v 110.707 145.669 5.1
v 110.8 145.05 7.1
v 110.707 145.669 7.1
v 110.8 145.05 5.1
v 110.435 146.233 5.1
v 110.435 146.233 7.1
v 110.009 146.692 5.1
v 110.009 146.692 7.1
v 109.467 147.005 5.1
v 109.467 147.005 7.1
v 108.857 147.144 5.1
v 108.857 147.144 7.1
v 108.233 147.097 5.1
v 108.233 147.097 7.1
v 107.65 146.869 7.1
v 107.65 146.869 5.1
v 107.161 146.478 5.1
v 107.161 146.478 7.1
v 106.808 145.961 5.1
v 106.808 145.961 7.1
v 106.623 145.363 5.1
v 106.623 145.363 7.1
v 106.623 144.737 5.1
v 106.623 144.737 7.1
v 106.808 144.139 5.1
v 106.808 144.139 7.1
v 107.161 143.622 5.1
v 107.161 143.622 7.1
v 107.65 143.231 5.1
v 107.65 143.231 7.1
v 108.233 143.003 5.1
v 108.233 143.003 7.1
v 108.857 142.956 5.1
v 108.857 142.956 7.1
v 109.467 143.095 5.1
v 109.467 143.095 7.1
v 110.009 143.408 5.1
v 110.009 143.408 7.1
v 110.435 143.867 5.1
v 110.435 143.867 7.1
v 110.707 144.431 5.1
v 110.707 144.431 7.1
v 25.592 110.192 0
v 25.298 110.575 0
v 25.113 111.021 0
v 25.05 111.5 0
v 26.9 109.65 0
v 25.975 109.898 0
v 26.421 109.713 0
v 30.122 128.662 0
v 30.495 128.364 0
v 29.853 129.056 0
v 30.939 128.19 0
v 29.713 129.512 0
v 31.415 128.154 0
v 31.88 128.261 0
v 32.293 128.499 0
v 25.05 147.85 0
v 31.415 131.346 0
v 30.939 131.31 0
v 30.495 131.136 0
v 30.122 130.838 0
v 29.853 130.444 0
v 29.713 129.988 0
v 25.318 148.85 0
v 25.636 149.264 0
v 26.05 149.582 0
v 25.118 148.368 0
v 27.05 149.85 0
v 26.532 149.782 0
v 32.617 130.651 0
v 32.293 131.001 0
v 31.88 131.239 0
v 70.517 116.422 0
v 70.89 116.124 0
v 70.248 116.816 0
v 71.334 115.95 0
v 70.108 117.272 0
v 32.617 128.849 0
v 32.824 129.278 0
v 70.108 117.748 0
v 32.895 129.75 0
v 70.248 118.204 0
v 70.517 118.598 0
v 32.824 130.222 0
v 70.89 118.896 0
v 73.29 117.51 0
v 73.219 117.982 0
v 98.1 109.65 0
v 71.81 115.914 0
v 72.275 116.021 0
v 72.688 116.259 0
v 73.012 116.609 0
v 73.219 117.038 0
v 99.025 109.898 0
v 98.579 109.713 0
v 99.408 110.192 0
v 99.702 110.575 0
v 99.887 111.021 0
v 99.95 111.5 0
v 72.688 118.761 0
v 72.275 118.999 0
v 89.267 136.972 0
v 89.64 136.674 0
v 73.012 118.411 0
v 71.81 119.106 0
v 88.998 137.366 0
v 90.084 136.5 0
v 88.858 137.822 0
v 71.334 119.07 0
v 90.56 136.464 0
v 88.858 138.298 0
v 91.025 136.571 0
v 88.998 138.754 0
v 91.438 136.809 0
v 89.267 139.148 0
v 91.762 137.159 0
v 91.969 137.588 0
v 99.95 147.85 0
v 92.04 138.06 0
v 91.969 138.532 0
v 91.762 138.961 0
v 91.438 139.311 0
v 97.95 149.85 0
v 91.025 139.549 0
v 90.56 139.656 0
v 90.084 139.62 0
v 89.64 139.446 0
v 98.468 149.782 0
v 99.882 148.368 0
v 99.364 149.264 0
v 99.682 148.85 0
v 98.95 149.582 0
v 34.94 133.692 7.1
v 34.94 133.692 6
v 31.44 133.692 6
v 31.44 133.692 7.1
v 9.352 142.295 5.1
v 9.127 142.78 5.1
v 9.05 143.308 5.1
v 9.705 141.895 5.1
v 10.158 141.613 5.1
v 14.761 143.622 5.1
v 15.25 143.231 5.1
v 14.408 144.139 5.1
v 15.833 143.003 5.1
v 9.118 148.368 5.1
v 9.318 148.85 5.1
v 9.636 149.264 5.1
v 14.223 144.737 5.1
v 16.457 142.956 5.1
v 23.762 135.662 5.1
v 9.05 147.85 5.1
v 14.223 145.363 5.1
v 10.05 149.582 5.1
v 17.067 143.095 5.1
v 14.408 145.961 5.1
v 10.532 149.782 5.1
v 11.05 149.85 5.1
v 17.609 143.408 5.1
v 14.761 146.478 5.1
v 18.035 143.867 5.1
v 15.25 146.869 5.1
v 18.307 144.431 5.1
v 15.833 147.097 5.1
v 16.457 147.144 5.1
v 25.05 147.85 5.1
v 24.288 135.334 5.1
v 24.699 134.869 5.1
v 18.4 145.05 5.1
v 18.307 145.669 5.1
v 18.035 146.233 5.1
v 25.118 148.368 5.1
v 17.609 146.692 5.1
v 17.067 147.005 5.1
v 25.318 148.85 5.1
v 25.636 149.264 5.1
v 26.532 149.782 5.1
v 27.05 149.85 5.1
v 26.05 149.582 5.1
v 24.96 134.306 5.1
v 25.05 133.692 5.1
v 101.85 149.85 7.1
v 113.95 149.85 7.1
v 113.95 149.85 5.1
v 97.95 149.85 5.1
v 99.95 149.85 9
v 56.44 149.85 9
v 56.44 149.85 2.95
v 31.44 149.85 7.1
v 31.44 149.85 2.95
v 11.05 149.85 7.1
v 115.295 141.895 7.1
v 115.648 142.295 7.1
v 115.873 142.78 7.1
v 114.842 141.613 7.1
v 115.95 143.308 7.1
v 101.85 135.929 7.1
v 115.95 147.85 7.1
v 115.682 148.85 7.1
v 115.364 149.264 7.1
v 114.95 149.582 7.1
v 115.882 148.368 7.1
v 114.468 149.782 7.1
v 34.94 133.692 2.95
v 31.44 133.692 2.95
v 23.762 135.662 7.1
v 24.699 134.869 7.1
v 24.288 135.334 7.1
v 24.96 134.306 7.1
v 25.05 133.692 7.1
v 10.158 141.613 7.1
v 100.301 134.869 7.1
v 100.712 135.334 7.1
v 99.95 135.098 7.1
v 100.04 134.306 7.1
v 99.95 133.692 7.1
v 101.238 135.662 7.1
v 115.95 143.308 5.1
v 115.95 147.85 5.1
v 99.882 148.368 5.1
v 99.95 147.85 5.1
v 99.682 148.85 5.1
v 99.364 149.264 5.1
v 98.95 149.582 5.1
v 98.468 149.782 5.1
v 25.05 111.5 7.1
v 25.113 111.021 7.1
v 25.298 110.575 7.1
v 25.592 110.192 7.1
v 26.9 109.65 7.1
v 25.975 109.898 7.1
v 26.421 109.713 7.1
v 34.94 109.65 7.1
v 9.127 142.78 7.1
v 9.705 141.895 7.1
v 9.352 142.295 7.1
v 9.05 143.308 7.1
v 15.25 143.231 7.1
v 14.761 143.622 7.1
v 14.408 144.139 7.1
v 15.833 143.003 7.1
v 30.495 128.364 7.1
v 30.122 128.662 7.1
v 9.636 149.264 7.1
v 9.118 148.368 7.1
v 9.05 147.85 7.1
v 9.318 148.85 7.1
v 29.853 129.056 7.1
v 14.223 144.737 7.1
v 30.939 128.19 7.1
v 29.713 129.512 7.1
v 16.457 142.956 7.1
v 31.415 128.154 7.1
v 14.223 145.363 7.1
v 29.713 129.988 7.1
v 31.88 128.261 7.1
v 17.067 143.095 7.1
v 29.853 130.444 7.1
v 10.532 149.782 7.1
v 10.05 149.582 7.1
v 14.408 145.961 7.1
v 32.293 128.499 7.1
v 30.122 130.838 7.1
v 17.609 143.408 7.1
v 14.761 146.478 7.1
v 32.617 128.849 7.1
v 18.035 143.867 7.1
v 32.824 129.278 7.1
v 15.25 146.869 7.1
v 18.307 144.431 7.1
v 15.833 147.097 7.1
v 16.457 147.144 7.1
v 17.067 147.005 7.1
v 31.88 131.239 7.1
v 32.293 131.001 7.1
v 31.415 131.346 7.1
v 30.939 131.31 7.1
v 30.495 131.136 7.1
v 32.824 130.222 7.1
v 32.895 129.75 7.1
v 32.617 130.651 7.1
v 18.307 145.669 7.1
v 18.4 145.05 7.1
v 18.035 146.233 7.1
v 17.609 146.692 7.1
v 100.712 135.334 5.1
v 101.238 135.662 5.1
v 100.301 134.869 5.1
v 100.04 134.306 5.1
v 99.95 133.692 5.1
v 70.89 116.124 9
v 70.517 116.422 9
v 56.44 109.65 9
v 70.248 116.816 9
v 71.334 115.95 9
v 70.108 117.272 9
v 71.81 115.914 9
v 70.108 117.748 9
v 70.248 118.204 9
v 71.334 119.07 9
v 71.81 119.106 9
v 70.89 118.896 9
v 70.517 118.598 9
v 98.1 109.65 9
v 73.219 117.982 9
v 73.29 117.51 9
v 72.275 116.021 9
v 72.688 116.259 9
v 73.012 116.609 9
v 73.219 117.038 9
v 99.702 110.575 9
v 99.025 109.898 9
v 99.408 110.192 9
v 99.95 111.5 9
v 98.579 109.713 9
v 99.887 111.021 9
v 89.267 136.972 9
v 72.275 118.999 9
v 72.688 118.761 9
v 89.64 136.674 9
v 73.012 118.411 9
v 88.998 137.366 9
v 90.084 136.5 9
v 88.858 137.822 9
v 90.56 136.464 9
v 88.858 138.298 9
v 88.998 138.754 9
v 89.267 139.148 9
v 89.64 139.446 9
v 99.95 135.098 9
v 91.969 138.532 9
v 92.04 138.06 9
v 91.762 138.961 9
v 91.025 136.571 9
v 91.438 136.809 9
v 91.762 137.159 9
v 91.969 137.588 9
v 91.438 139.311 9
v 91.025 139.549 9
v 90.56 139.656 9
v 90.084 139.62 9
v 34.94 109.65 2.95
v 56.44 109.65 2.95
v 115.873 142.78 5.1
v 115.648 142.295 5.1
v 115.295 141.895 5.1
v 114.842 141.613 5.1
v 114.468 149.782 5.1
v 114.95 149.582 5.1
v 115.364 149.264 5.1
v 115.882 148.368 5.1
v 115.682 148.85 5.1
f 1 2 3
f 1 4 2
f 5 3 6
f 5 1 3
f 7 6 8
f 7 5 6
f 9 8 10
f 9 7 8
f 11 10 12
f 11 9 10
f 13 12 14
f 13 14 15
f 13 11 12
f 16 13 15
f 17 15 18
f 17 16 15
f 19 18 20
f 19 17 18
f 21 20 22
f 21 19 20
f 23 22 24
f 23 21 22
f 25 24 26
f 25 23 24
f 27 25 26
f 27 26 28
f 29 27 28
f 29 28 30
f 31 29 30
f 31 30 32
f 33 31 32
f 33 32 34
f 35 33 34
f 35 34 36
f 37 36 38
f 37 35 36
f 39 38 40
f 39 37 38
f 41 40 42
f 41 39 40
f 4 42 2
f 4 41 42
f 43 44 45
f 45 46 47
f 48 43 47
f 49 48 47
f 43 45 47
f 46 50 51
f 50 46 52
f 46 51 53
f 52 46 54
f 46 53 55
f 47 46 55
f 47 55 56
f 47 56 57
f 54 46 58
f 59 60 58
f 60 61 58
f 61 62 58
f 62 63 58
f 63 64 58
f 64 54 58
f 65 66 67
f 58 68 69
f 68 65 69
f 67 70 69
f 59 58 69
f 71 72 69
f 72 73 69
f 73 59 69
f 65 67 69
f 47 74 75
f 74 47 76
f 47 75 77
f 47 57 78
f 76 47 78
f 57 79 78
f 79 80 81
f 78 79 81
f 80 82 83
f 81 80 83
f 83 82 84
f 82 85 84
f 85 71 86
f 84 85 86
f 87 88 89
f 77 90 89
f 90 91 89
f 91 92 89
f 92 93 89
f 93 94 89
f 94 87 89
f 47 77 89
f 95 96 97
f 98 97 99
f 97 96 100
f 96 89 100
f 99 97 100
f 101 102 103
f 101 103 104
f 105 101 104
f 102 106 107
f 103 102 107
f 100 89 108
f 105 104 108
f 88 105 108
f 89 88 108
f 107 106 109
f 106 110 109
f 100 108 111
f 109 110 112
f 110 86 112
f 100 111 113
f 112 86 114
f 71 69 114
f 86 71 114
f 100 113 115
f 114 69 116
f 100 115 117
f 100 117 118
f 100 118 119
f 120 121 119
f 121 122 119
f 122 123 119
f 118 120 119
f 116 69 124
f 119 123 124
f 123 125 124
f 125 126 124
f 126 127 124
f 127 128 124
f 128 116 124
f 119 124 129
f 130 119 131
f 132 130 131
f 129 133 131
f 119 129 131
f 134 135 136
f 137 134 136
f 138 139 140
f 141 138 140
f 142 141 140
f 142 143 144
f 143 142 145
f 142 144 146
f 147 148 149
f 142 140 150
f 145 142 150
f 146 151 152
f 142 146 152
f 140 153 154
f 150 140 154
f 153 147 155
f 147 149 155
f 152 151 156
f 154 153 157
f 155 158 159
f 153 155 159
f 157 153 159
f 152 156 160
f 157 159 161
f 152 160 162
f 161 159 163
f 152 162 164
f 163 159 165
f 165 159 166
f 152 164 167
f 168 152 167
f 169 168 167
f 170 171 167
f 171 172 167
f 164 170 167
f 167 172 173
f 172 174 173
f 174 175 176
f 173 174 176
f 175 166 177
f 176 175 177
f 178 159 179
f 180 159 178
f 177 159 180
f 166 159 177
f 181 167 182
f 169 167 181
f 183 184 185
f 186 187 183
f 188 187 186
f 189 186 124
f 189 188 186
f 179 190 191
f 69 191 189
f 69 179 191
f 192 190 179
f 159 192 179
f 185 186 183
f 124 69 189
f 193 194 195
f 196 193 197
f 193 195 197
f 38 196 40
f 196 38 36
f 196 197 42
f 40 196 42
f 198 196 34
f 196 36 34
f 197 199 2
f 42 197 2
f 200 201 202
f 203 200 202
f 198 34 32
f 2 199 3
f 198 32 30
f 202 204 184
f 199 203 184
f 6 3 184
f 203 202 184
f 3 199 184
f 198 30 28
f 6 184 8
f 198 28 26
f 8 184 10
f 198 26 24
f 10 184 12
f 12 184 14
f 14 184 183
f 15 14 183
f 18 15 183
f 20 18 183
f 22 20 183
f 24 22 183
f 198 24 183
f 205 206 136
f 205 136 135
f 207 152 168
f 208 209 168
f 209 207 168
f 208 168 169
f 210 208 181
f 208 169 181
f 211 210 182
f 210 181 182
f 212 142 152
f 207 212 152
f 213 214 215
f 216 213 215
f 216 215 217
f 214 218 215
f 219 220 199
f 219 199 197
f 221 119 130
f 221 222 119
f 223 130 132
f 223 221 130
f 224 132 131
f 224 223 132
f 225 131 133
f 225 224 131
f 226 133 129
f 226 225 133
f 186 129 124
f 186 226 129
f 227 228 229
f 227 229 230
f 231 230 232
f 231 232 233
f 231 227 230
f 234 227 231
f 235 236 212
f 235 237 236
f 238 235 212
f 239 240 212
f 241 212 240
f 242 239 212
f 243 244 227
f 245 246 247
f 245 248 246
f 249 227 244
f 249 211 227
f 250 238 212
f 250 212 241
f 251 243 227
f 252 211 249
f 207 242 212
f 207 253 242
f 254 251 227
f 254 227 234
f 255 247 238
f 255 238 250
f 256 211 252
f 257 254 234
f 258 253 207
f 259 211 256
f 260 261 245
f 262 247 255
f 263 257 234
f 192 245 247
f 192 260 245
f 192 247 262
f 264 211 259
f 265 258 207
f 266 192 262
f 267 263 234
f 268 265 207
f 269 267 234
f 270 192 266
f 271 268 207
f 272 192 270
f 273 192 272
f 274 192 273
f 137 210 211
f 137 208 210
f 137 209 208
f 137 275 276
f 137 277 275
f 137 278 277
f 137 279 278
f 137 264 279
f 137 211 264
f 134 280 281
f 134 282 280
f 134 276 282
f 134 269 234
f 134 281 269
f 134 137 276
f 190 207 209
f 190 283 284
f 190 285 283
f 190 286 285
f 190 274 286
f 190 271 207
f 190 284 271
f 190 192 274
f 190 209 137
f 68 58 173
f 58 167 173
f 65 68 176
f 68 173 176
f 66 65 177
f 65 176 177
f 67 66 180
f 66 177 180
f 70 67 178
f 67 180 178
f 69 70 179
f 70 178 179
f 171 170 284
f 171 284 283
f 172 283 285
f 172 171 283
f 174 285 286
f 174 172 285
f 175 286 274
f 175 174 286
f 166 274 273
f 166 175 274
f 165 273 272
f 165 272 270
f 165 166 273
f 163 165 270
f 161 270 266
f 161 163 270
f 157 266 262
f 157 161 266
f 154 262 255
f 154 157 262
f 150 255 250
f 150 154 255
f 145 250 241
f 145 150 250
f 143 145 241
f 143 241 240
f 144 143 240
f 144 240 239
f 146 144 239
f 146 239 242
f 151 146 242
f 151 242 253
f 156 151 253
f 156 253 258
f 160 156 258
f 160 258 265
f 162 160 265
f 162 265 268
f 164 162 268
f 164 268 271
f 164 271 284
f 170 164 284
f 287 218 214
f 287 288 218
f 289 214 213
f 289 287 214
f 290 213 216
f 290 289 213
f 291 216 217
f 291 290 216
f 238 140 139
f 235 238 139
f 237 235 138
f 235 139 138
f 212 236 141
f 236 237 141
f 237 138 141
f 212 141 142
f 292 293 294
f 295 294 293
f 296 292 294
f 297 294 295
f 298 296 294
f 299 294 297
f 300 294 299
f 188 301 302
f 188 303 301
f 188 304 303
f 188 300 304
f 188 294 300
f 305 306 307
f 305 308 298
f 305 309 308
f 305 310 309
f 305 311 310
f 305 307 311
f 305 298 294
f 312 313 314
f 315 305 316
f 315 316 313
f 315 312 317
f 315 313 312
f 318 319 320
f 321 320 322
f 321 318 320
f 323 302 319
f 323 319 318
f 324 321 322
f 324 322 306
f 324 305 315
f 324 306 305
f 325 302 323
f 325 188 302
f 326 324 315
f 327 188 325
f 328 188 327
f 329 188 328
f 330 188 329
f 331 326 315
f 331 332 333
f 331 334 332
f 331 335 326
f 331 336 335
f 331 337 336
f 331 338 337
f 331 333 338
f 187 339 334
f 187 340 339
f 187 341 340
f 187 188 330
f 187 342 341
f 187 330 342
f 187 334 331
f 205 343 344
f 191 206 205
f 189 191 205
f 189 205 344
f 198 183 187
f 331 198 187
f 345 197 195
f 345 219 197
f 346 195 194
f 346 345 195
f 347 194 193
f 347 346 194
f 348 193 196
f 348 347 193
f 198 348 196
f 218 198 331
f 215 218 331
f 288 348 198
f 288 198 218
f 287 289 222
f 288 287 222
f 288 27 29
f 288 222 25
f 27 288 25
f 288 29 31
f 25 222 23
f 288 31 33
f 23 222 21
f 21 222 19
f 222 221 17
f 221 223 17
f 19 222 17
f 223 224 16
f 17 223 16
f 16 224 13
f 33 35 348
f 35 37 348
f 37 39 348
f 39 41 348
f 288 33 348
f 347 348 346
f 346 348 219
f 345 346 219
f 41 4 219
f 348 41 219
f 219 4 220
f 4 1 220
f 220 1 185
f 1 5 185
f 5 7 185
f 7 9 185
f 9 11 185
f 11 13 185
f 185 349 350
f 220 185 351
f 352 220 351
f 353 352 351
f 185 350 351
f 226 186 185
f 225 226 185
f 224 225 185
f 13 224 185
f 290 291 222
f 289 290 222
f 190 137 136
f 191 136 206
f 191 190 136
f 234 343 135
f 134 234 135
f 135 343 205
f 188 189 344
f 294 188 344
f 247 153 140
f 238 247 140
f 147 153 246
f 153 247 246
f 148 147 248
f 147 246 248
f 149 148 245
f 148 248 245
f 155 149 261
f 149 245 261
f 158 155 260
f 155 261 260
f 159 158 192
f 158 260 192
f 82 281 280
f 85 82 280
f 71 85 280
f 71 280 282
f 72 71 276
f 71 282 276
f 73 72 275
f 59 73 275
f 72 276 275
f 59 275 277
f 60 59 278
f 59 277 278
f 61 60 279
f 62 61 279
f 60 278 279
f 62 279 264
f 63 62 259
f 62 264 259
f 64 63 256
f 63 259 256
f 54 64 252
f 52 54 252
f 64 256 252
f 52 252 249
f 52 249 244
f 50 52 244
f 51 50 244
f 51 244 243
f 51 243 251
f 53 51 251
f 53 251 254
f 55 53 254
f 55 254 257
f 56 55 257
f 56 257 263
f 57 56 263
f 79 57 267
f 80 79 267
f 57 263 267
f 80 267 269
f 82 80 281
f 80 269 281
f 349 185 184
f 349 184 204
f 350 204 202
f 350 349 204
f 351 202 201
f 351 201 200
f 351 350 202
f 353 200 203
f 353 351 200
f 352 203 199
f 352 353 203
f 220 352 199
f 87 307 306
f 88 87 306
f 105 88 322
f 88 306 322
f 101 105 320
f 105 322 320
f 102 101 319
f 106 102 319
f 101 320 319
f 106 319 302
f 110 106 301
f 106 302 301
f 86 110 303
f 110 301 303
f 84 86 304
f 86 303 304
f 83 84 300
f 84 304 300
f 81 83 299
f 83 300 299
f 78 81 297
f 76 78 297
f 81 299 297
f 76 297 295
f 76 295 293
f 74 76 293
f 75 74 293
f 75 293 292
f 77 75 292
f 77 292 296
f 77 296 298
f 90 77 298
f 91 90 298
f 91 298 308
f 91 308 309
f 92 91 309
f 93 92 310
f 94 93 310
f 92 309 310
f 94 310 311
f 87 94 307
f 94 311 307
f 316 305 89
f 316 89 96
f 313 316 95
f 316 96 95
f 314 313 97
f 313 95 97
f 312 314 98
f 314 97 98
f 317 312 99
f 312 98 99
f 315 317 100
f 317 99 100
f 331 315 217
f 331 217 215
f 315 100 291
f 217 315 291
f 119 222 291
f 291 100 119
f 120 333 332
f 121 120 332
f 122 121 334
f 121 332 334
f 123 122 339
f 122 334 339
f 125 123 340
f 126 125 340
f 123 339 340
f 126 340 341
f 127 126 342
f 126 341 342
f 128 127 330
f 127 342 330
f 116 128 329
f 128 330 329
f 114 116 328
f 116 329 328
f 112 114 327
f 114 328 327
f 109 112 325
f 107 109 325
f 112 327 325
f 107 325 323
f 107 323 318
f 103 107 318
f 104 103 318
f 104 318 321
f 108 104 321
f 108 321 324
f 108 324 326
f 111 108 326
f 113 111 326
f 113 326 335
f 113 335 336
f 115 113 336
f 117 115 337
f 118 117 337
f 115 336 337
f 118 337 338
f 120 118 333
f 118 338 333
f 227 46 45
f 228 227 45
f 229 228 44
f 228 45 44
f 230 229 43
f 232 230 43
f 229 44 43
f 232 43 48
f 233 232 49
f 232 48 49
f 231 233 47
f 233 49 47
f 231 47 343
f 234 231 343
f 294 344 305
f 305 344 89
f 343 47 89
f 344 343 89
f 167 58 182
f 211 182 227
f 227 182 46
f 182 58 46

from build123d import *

# Parameters (mm, degrees)
BOSS_EXTRUDE1_DEPTH  = 5.1
SKETCH2_R            = 2.1
BOSS_EXTRUDE2_DEPTH  = 0.9
FILLET1_R            = 2
SKETCH3_R            = 2.1
BOSS_EXTRUDE3_DEPTH  = 1.1
BOSS_EXTRUDE4_DEPTH  = 16.158031
SKETCH5_W            = 25
SKETCH5_H            = 40.2
CUT_EXTRUDE2_DEPTH   = 3.05
SKETCH6_W            = 6
SKETCH6_H            = 24.2
BOSS_EXTRUDE5_DEPTH  = 3.5
CUT_EXTRUDE3_DEPTH   = 16.158031
BOSS_EXTRUDE6_DEPTH  = 3
BOSS_EXTRUDE7_REACH  = 42.2
SKETCH21_R           = 1.6
CUT_EXTRUDE6_DEPTH   = 9
CUT_EXTRUDE7_DEPTH   = 17.15803115
SKETCH23_W           = 1.1
SKETCH23_H           = 16.15803115
BOSS_EXTRUDE9_DEPTH  = 6.39
SKETCH26_W           = 3.5
SKETCH26_H           = 3.05
CUT_EXTRUDE11_DEPTH  = 0.158031
BOSS_EXTRUDE10_DEPTH = 1.1
SKETCH28_R           = 1.6
CUT_EXTRUDE12_DEPTH  = 7.1


with BuildPart() as part:
    # Sketch1 → Boss-Extrude1 (new body)
    with BuildSketch(Plane.XY):
        with BuildLine():
            Line((99.95, 149.85), (25.05, 149.85))
            Line((25.05, 149.85), (25.05, 148))
            Line((25.05, 148), (25.05, 111.5))
            ThreePointArc((25.05, 111.5), (25.591852455, 110.191852455), (26.9, 109.65))
            Line((26.9, 109.65), (98.1, 109.65))
            ThreePointArc((98.1, 109.65), (99.408147545, 110.191852455), (99.95, 111.5))
            Line((99.95, 111.5), (99.95, 148))
            Line((99.95, 148), (99.95, 149.85))
        make_face()
    extrude(amount=BOSS_EXTRUDE1_DEPTH)

    # Sketch2 → Boss-Extrude2 (add)
    with BuildSketch(Plane.XY.offset(5.1)):
        with BuildLine():
            Line((102.1, 149.85), (22.9, 149.85))
            Line((22.9, 149.85), (9.05, 149.85))
            Line((9.05, 149.85), (9.05, 148))
            Line((9.05, 148), (9.05, 143.30803115))
            ThreePointArc((9.05, 143.30803115), (9.351726371, 142.295436082), (10.158485157, 141.61314008))
            Line((10.158485157, 141.61314008), (23.761760493, 135.66170712))
            ThreePointArc((23.761760493, 135.66170712), (24.699345028, 134.868768523), (25.05, 133.69196885))
            Line((25.05, 133.69196885), (25.05, 111.5))
            ThreePointArc((25.05, 111.5), (25.591852455, 110.191852455), (26.9, 109.65))
            Line((26.9, 109.65), (98.1, 109.65))
            ThreePointArc((98.1, 109.65), (99.408147545, 110.191852455), (99.95, 111.5))
            Line((99.95, 111.5), (99.95, 133.69196885))
            ThreePointArc((99.95, 133.69196885), (100.300654972, 134.868768523), (101.238239507, 135.66170712))
            Line((101.238239507, 135.66170712), (114.841514843, 141.61314008))
            ThreePointArc((114.841514843, 141.61314008), (115.648273629, 142.295436082), (115.95, 143.30803115))
            Line((115.95, 143.30803115), (115.95, 148))
            Line((115.95, 148), (115.95, 149.85))
            Line((115.95, 149.85), (102.1, 149.85))
        make_face()
        with Locations((16.3, 145.05)):
            Circle(SKETCH2_R, mode=Mode.SUBTRACT)
        with Locations((108.7, 145.05)):
            Circle(SKETCH2_R, mode=Mode.SUBTRACT)
    extrude(amount=BOSS_EXTRUDE2_DEPTH)

    # Fillet1
    fillet1_edges = [part.edges().sort_by_distance(p)[0] for p in [
        (25.05, 149.85, 2.55),
        (99.95, 149.85, 2.55),
        (115.95, 149.85, 5.55),
        (9.05, 149.85, 5.55),
    ]]
    fillet(fillet1_edges, radius=FILLET1_R)

    # Sketch3 → Boss-Extrude3 (add)
    with BuildSketch(Plane.XY.offset(6)):
        with BuildLine():
            Line((99.95, 133.69196885), (99.95, 149.85))
            Line((99.95, 149.85), (113.95, 149.85))
            ThreePointArc((113.95, 149.85), (115.364213562, 149.264213562), (115.95, 147.85))
            Line((115.95, 147.85), (115.95, 143.30803115))
            ThreePointArc((115.95, 143.30803115), (115.648273629, 142.295436082), (114.841514843, 141.61314008))
            Line((114.841514843, 141.61314008), (101.238239507, 135.66170712))
            ThreePointArc((101.238239507, 135.66170712), (100.300654972, 134.868768523), (99.95, 133.69196885))
        make_face()
        with Locations((108.7, 145.05)):
            Circle(SKETCH3_R, mode=Mode.SUBTRACT)
        with BuildLine():
            Line((11.05, 149.85), (25.05, 149.85))
            Line((25.05, 149.85), (25.05, 133.69196885))
            ThreePointArc((25.05, 133.69196885), (24.699345028, 134.868768523), (23.761760493, 135.66170712))
            Line((23.761760493, 135.66170712), (10.158485157, 141.61314008))
            ThreePointArc((10.158485157, 141.61314008), (9.351726371, 142.295436082), (9.05, 143.30803115))
            Line((9.05, 143.30803115), (9.05, 147.85))
            ThreePointArc((9.05, 147.85), (9.635786438, 149.264213562), (11.05, 149.85))
        make_face()
        with Locations((16.3, 145.05)):
            Circle(SKETCH3_R, mode=Mode.SUBTRACT)
    extrude(amount=BOSS_EXTRUDE3_DEPTH)

    # Sketch4 → Boss-Extrude4 (add)
    with BuildSketch(Plane(origin=(0, 149.85, 0), x_dir=(1, 0, 0), z_dir=(0, 1, 0))):
        Polygon((25.05, -7.1), (27.55, -6), (25.05, -6), align=None)
        Polygon((97.45, -6), (99.95, -7.1), (99.95, -6), align=None)
    extrude(amount=-BOSS_EXTRUDE4_DEPTH)

    # Sketch5 → Cut-Extrude2 (cut)
    with BuildSketch(Plane.XY.offset(6)):
        with Locations((43.94, 129.75)):
            Rectangle(SKETCH5_W, SKETCH5_H)
    extrude(amount=-CUT_EXTRUDE2_DEPTH, mode=Mode.SUBTRACT)

    # Sketch6 → Boss-Extrude5 (add)
    with BuildSketch(Plane(origin=(31.44, 0, 0), x_dir=(0, 0, -1), z_dir=(1, 0, 0))):
        with Locations((-3, 121.75)):
            Rectangle(SKETCH6_W, SKETCH6_H)
    extrude(amount=BOSS_EXTRUDE5_DEPTH)

    # Sketch9 → Cut-Extrude3 (cut)
    with BuildSketch(Plane.XZ.offset(-133.69196885)):
        Polygon((97.45, 6), (99.95, 7.1), (99.95, 6), align=None)
    extrude(amount=-CUT_EXTRUDE3_DEPTH, mode=Mode.SUBTRACT)

    # Sketch10 → Boss-Extrude6 (add)
    with BuildSketch(Plane.XY.offset(6)):
        with BuildLine():
            Line((56.44, 149.85), (56.44, 109.65))
            Line((56.44, 109.65), (98.1, 109.65))
            ThreePointArc((98.1, 109.65), (99.408147545, 110.191852455), (99.95, 111.5))
            Line((99.95, 111.5), (99.95, 149.85))
            Line((99.95, 149.85), (56.44, 149.85))
        make_face()
    extrude(amount=BOSS_EXTRUDE6_DEPTH)

    # Boss-Extrude7: up to this face of the body (flat: up to its plane)
    boss_extrude7_end = Plane(part.part.faces().sort_by_distance((108.039877175, 138.6374236, 6.1))[0])
    # Sketch12 → Boss-Extrude7 (add, up to the picked face)
    with BuildSketch(Plane(origin=(0, 149.85, 0), x_dir=(1, 0, 0), z_dir=(0, 1, 0)), mode=Mode.PRIVATE) as boss_extrude7_sk1:
        Polygon((99.95, -9), (99.95, -7.1), (101.85, -7.1), align=None)
    boss_extrude7_tool1 = split(extrude(boss_extrude7_sk1.sketch, amount=-BOSS_EXTRUDE7_REACH, mode=Mode.PRIVATE), bisect_by=boss_extrude7_end, keep=Keep.BOTH, mode=Mode.PRIVATE)
    add(boss_extrude7_tool1.solids().sort_by_distance((100.583333, 149.85, 7.733333))[0])

    # Sketch21 → Cut-Extrude6 (cut)
    with BuildSketch(Plane.XY.offset(9)):
        with Locations((90.44, 138.06)):
            Circle(SKETCH21_R)
        with Locations((71.69, 117.51)):
            Circle(SKETCH21_R)
    extrude(amount=-CUT_EXTRUDE6_DEPTH, mode=Mode.SUBTRACT)

    # Sketch22 → Cut-Extrude7 (cut, through all)
    with BuildSketch(Plane.XZ.offset(-133.69196885)):
        Polygon((25.05, 7.1), (25.05, 6), (27.55, 6), align=None)
    extrude(amount=-CUT_EXTRUDE7_DEPTH, mode=Mode.SUBTRACT)

    # Sketch23 → Boss-Extrude9 (add)
    with BuildSketch(Plane(origin=(25.05, 0, 0), x_dir=(0, 0, -1), z_dir=(1, 0, 0))):
        with Locations((-6.55, 141.770984425)):
            Rectangle(SKETCH23_W, SKETCH23_H)
    extrude(amount=BOSS_EXTRUDE9_DEPTH)

    # Sketch26 → Cut-Extrude11 (cut)
    with BuildSketch(Plane(origin=(0, 133.85, 0), x_dir=(1, 0, 0), z_dir=(0, 1, 0))):
        with Locations((33.19, -4.475)):
            Rectangle(SKETCH26_W, SKETCH26_H)
    extrude(amount=-CUT_EXTRUDE11_DEPTH, mode=Mode.SUBTRACT)

    # Sketch27 → Boss-Extrude10 (add)
    with BuildSketch(Plane.XY.offset(6)):
        with BuildLine():
            Line((34.94, 109.65), (34.94, 133.69196885))
            Line((34.94, 133.69196885), (25.05, 133.69196885))
            Line((25.05, 133.69196885), (25.05, 111.5))
            ThreePointArc((25.05, 111.5), (25.591852455, 110.191852455), (26.9, 109.65))
            Line((26.9, 109.65), (34.94, 109.65))
        make_face()
    extrude(amount=BOSS_EXTRUDE10_DEPTH)

    # Sketch28 → Cut-Extrude12 (cut)
    with BuildSketch(Plane.XY.offset(7.1)):
        with Locations((31.295, 129.75)):
            Circle(SKETCH28_R)
    extrude(amount=-CUT_EXTRUDE12_DEPTH, mode=Mode.SUBTRACT)


solid = part.part
